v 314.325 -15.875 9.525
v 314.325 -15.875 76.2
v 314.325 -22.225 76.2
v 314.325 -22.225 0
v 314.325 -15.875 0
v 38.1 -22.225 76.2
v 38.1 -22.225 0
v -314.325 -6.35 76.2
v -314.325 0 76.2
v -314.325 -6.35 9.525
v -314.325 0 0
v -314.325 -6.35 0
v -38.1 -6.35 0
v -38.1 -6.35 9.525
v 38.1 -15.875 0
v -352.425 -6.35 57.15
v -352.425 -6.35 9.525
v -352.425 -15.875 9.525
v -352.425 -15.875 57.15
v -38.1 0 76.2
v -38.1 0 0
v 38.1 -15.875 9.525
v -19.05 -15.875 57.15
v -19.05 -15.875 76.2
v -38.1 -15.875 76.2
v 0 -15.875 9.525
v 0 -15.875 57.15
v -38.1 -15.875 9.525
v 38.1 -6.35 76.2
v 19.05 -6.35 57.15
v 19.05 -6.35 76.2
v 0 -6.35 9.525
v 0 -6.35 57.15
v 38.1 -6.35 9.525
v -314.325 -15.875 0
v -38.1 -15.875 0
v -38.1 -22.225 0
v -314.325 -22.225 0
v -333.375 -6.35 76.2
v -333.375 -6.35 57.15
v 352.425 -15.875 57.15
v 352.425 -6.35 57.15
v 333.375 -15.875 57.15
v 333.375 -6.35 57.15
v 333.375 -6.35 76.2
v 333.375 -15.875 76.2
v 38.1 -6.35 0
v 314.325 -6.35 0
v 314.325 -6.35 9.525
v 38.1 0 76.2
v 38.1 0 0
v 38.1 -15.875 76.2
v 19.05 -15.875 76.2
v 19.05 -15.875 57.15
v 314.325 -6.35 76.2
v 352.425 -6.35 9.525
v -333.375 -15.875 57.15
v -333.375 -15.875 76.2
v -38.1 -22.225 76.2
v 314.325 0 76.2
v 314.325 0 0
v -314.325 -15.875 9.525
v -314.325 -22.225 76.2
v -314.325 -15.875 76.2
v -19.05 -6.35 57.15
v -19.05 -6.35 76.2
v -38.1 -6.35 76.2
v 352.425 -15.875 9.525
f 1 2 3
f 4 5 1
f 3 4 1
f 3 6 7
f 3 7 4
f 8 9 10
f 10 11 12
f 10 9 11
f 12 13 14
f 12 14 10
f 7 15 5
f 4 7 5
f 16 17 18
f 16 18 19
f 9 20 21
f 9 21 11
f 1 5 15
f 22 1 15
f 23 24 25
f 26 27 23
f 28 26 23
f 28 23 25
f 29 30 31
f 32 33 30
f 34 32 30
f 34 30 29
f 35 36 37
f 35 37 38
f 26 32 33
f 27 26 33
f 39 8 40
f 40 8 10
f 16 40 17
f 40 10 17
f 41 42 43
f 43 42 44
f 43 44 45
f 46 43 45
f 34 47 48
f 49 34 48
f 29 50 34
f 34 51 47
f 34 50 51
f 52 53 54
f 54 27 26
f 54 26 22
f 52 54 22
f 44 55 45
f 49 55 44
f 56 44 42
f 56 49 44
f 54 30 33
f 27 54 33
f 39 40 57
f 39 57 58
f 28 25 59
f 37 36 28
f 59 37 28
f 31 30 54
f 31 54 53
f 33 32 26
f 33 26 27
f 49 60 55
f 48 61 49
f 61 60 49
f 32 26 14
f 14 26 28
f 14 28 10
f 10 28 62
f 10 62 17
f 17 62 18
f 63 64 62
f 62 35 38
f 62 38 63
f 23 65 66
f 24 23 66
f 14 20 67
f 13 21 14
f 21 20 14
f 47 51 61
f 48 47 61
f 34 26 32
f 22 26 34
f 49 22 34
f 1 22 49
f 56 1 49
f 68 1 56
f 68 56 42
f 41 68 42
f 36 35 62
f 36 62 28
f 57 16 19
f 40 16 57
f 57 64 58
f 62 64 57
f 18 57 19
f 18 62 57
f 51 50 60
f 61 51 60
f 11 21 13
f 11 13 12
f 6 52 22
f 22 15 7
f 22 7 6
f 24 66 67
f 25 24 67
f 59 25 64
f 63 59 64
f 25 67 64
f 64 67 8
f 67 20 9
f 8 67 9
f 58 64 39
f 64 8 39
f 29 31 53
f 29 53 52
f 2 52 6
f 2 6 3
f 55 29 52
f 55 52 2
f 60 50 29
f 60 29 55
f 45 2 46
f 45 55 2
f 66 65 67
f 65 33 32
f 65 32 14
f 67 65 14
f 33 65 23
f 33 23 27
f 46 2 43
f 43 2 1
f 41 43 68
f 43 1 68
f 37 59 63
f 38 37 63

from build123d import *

# Parameters (mm, degrees)
F0_W     = 352.425
F0_H     = 76.2
F1_DEPTH = 22.225
F2_W     = 38.1
F2_H     = 9.525
F2_W_2   = 276.225
F3_DEPTH = 9.525
F2_H_2   = 6.35
F4_DEPTH = 76.2
F5_W     = 19.05
F5_H     = 19.05
F6_DEPTH = 9.525


with BuildPart() as f1:
    # F0 (on Front) → F1 (new body)
    with BuildSketch(Plane.XZ):
        with Locations((176.2125, 38.1)):
            Rectangle(F0_W, F0_H)
    extrude(amount=F1_DEPTH)

    # F2 (on face) → F3 (cut)
    with BuildSketch(Plane(origin=(0, 0, 0), x_dir=(1, 0, 0), z_dir=(0, 0, -1))):
        with Locations((333.375, 11.1125)):
            Rectangle(F2_W, F2_H)
        with Locations((176.2125, 11.1125)):
            Rectangle(F2_W_2, F2_H)
        with Locations((19.05, 11.1125)):
            Rectangle(F2_W, F2_H)
    extrude(amount=-F3_DEPTH, mode=Mode.SUBTRACT)

    # F2 (on face) → F4 (cut, through all)
    with BuildSketch(Plane(origin=(0, 0, 0), x_dir=(1, 0, 0), z_dir=(0, 0, -1))):
        with Locations((19.05, 19.05)):
            Rectangle(F2_W, F2_H_2)
        with Locations((333.375, 19.05)):
            Rectangle(F2_W, F2_H_2)
        with Locations((333.375, 3.175)):
            Rectangle(F2_W, F2_H_2)
        with Locations((19.05, 3.175)):
            Rectangle(F2_W, F2_H_2)
    extrude(amount=-F4_DEPTH, mode=Mode.SUBTRACT)

    # F5 (on face) → F6 (cut, through all)
    with BuildSketch(Plane(origin=(0, -6.35, 0), x_dir=(-1, 0, 0), z_dir=(0, 1, 0))):
        with Locations((-342.9, 66.675)):
            Rectangle(F5_W, F5_H)
        with Locations((-9.525, 66.675)):
            Rectangle(F5_W, F5_H)
    extrude(amount=-F6_DEPTH, mode=Mode.SUBTRACT)


with BuildPart() as f7_1:
    # F7: instance of F1
    add(f1.part.mirror(Plane.YZ))


solid = Compound([f1.part, f7_1.part])
